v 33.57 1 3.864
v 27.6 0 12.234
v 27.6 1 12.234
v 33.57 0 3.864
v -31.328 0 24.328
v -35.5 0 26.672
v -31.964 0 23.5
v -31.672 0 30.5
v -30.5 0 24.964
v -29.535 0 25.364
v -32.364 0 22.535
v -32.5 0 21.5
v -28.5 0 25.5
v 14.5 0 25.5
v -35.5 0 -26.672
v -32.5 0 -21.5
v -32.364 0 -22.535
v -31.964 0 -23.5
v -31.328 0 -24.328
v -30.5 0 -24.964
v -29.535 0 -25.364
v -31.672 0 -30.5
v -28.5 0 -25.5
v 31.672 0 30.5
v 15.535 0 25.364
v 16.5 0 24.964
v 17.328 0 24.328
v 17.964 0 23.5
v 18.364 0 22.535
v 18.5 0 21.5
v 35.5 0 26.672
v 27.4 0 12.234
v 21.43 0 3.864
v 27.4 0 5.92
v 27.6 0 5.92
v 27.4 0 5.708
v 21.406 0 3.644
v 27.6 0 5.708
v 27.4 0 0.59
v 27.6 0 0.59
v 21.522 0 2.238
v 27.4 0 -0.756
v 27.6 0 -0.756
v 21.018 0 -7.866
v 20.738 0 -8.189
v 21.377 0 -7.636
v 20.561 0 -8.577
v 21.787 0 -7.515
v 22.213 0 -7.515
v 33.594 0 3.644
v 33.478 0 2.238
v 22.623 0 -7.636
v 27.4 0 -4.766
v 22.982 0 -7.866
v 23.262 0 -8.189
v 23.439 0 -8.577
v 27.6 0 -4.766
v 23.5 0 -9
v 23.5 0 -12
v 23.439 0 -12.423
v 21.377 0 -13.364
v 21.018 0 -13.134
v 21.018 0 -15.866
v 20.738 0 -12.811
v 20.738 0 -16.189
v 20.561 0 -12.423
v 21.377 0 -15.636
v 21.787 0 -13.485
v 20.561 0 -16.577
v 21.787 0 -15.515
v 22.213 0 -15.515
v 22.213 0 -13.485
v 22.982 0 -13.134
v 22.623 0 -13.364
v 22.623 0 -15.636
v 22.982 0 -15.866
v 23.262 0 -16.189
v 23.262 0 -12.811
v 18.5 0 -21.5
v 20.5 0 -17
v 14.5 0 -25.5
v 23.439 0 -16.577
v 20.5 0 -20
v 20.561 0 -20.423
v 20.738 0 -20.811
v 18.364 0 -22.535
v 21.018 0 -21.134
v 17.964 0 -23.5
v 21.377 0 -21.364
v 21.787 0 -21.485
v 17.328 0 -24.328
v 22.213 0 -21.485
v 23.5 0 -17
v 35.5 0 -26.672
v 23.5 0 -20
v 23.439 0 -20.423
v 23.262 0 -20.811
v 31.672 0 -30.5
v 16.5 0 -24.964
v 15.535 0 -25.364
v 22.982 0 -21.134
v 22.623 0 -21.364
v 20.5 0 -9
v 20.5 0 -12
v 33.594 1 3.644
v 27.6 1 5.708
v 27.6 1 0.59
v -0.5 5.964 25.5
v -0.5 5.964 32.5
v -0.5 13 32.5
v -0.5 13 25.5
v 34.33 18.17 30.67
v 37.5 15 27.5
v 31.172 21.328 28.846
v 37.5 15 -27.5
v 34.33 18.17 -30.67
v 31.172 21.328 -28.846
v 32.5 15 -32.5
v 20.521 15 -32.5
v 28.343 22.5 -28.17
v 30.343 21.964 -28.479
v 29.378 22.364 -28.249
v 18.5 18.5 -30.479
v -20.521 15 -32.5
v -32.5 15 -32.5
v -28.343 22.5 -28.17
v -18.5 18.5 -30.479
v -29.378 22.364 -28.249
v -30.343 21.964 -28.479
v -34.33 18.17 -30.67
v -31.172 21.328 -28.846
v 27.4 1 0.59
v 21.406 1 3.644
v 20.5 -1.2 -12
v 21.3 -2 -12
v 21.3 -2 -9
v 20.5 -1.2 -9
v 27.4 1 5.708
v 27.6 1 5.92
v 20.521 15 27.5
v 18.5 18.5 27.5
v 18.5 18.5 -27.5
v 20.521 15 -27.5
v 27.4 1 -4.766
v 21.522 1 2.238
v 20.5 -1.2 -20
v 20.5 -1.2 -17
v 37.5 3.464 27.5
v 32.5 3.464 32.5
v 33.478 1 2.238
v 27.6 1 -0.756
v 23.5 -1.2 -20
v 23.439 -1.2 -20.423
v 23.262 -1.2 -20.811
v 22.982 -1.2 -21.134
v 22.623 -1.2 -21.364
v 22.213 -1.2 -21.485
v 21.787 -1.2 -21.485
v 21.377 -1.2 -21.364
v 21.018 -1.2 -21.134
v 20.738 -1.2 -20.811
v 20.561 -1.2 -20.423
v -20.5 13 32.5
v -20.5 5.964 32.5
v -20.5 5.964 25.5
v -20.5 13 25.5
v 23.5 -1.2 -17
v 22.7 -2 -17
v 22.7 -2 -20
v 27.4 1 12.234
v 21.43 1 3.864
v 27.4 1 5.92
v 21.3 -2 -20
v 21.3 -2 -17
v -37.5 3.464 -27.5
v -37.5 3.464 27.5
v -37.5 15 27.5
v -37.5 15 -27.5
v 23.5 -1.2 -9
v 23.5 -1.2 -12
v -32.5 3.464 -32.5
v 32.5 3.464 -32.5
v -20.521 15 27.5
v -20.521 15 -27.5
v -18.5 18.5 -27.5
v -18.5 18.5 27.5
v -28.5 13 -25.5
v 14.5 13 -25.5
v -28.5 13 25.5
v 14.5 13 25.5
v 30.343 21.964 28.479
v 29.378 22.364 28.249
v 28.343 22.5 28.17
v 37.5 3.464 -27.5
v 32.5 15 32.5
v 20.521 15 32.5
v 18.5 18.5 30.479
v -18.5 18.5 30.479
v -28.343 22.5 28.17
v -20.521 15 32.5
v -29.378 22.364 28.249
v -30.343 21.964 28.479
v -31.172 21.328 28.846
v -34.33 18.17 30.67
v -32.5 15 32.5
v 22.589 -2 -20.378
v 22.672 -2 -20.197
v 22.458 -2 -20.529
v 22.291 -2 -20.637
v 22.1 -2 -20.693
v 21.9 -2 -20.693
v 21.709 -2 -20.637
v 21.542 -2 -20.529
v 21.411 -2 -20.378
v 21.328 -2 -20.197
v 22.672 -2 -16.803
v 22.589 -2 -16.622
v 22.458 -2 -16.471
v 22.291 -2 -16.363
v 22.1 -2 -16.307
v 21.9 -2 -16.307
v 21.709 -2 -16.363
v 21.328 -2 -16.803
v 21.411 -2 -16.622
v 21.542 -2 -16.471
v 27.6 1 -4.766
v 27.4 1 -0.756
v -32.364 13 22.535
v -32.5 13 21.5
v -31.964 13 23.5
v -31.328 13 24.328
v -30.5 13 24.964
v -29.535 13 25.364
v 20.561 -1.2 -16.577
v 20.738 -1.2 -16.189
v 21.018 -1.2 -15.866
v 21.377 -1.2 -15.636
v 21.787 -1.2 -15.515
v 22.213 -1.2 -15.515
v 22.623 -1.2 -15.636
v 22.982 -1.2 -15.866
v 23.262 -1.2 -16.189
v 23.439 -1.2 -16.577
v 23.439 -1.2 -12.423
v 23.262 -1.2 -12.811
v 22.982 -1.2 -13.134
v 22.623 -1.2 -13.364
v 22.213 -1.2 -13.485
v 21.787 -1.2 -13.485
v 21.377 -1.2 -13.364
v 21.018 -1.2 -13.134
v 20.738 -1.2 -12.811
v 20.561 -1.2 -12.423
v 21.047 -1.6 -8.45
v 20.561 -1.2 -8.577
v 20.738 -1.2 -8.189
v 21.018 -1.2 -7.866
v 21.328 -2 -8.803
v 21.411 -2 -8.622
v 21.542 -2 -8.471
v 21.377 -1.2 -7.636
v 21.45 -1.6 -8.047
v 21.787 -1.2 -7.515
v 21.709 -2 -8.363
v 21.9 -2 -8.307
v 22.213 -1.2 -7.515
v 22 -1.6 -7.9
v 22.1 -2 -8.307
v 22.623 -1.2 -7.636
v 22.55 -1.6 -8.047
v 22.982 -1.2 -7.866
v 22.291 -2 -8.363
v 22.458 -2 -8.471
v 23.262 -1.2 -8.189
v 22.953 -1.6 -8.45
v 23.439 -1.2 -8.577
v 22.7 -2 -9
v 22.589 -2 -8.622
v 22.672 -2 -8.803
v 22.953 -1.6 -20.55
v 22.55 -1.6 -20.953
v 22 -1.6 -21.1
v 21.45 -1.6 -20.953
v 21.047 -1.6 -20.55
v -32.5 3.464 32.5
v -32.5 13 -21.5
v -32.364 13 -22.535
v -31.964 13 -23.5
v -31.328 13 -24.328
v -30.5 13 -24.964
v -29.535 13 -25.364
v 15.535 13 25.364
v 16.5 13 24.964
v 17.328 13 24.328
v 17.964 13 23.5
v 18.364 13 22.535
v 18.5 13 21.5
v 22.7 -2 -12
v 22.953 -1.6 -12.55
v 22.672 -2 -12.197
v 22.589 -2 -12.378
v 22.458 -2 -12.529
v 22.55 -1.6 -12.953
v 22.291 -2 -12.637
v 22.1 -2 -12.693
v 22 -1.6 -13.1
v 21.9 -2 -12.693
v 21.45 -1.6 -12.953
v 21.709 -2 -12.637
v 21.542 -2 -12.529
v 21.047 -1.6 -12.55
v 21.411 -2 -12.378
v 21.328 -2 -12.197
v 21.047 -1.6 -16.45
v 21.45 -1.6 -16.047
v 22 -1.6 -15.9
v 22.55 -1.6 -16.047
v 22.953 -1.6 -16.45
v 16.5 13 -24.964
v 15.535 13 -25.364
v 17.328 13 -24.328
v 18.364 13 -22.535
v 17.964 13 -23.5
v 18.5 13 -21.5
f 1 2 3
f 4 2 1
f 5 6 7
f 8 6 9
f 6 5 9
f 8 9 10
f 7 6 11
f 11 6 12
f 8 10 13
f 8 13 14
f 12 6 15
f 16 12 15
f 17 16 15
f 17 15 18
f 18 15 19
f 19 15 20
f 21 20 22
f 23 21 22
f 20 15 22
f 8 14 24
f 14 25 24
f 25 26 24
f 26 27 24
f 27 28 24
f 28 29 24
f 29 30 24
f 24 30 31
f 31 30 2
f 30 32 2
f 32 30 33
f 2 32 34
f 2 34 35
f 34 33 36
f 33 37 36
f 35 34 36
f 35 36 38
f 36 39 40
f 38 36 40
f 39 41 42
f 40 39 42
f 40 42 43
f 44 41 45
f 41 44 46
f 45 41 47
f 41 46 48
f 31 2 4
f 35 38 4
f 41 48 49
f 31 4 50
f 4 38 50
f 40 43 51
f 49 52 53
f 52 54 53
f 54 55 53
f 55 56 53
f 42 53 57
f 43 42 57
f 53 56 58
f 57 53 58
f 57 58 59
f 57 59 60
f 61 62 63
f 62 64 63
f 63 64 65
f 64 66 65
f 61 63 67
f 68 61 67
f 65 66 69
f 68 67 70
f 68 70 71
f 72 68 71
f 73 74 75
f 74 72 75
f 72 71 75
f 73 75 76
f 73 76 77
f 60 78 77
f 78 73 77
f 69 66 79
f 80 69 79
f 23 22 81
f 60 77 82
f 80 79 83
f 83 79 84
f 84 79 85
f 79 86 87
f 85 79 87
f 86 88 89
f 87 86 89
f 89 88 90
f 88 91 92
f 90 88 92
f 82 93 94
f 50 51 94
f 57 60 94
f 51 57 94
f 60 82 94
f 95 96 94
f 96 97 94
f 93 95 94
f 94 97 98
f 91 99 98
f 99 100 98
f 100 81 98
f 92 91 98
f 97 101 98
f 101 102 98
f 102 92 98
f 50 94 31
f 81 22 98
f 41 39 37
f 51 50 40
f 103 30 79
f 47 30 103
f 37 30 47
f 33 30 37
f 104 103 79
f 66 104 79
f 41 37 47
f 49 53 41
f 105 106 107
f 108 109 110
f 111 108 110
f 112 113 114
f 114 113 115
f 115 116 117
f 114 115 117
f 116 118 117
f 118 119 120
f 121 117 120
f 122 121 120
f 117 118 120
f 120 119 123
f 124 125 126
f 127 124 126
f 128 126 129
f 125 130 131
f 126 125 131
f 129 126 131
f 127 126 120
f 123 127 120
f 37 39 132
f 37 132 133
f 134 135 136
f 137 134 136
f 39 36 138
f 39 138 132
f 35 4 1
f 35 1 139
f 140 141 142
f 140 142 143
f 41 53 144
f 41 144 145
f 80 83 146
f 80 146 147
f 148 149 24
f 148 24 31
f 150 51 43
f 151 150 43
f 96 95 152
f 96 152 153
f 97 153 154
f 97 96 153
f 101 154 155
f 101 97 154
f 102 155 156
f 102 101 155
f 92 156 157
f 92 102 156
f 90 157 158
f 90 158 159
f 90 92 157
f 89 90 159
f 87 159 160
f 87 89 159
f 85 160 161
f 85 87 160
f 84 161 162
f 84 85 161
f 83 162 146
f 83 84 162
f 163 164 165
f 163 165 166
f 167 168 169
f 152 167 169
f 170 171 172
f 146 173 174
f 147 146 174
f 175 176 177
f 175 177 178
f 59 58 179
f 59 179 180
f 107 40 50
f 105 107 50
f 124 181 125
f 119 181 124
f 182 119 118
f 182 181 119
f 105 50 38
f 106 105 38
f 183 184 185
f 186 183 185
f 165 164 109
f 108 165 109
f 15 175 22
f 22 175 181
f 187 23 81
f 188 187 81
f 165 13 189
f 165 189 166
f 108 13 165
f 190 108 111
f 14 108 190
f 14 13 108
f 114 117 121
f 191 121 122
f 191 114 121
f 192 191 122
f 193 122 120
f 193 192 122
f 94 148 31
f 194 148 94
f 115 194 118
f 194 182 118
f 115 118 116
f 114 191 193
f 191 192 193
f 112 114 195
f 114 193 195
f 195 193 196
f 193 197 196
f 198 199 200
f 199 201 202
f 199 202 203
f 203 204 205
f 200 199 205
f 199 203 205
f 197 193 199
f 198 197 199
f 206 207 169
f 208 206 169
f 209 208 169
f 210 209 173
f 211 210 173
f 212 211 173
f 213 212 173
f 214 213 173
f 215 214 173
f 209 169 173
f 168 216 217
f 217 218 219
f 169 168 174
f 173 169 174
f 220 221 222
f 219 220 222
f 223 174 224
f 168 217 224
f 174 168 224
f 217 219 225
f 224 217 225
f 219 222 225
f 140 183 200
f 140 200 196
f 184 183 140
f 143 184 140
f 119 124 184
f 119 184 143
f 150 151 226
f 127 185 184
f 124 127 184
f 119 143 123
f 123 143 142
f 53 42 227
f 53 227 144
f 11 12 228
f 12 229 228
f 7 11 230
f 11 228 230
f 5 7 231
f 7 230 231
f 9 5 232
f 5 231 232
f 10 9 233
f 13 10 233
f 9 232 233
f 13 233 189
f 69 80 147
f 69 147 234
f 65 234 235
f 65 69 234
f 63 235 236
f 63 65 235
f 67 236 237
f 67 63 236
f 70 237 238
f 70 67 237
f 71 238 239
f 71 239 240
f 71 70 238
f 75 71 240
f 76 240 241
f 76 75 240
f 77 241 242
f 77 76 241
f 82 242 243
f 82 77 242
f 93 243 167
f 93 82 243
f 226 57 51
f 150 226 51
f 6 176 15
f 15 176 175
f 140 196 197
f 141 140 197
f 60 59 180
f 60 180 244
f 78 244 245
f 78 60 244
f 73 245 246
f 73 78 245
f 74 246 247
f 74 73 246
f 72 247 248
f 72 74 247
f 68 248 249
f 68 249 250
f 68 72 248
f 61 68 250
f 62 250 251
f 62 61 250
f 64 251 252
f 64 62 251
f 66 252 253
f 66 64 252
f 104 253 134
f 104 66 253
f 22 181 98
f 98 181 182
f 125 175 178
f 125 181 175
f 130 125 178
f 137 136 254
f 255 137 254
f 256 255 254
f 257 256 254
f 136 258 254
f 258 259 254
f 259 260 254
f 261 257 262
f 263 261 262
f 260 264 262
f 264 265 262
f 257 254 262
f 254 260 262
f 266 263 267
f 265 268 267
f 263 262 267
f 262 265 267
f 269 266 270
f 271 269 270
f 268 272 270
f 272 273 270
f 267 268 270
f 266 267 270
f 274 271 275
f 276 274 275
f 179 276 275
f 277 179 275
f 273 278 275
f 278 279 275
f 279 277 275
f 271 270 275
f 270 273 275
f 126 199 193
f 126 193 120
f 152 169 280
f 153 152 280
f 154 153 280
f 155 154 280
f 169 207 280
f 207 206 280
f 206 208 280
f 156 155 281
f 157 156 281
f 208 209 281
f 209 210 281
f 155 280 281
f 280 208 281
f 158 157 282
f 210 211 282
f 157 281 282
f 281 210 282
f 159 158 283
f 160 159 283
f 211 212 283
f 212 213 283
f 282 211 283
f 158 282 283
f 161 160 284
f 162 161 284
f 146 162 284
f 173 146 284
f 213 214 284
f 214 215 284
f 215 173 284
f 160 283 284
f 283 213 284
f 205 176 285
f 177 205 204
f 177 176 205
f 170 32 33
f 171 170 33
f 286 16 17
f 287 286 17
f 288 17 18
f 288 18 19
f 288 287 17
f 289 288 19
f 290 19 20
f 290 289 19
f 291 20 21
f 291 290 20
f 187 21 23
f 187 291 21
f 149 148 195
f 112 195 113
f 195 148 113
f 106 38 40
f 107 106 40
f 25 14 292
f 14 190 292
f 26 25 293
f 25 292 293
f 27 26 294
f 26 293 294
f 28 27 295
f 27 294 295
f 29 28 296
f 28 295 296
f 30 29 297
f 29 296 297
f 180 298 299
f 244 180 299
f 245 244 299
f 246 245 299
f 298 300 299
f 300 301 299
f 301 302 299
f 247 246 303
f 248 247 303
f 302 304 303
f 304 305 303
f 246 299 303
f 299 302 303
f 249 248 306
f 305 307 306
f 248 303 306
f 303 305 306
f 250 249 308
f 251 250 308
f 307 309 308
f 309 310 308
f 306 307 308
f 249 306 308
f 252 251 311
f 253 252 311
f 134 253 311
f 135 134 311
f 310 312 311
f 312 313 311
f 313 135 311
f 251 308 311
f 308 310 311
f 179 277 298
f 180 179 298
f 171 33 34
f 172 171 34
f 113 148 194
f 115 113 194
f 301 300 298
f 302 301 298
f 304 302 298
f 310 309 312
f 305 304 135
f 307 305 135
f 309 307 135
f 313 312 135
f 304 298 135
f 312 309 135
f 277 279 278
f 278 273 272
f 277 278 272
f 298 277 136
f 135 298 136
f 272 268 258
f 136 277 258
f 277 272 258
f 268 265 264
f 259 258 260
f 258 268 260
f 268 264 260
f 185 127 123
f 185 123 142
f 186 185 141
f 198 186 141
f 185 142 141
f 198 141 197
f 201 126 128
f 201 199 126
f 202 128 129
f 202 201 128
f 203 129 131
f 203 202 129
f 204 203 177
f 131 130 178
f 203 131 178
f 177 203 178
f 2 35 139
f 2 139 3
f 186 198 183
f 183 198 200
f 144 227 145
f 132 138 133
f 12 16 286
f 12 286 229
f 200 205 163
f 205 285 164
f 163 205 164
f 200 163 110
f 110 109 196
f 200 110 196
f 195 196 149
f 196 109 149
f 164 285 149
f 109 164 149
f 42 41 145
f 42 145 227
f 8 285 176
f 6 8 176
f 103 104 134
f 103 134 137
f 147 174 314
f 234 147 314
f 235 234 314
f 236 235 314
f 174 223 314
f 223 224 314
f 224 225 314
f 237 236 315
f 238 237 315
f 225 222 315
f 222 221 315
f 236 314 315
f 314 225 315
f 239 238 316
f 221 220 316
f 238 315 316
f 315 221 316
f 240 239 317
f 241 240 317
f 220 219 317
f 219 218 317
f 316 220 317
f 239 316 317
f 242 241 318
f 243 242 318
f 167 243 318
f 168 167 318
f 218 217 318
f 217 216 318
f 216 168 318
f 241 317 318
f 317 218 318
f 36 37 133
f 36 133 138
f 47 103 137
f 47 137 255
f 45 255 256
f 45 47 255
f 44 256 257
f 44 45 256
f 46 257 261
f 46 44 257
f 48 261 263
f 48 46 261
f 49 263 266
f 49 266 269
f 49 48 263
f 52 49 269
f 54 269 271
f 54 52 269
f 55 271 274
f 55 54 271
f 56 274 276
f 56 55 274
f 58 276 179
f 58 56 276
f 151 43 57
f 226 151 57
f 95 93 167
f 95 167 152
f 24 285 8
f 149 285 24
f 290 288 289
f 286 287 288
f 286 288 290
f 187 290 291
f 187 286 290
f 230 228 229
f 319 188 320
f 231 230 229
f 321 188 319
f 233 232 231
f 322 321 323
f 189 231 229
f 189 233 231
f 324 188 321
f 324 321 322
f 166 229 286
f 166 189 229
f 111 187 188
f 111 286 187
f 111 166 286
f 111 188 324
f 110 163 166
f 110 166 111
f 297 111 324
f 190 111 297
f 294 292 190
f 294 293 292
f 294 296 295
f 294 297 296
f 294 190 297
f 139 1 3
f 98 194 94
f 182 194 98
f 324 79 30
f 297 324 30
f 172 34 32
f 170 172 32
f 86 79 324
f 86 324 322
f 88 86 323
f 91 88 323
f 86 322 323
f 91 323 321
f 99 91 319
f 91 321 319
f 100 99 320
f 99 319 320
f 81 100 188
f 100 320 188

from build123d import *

# Parameters (mm, degrees)
SKETCH2_W           = 75
SKETCH2_H           = 65
BOSS_EXTRUDE1_DEPTH = 15
BOSS_EXTRUDE3_START = -5
BOSS_EXTRUDE3_DEPTH = 55
CHAMFER1_SIZE       = 5
CHAMFER1_SIZE_2     = 8.660254038
CHAMFER2_SIZE       = 8.660254038
CHAMFER2_SIZE_2     = 5
FILLET3_R           = 4
SKETCH5_W           = 51
SKETCH5_H           = 51
CUT_EXTRUDE2_DEPTH  = 13
CHAMFER3_SIZE       = 5
FILLET4_R           = 4
CUT_EXTRUDE3_DEPTH  = 1
BOSS_EXTRUDE4_DEPTH = 2
CHAMFER5_SIZE       = 0.8
CHAMFER6_SIZE       = 2
CHAMFER6_SIZE2      = 3.464101615
CUT_EXTRUDE4_REACH  = 80.342
SKETCH10_W          = 20
SKETCH10_H          = 7.035898385


with BuildPart() as part:
    # Sketch2 → Boss-Extrude1 (new body)
    with BuildSketch(Plane(origin=(0, 0, 0), x_dir=(1, 0, 0), z_dir=(0, 1, 0))):
        Rectangle(SKETCH2_W, SKETCH2_H)
    extrude(amount=BOSS_EXTRUDE1_DEPTH)

    # Sketch4 → Boss-Extrude3 (add)
    with BuildSketch(Plane.XY.offset(32.5).offset(BOSS_EXTRUDE3_START)):
        Polygon((-30, 22.5), (-37.5, 15), (-20.520725942, 15), (-18.5, 18.5), (18.5, 18.5), (20.520725942, 15), (37.5, 15), (30, 22.5), align=None)
    extrude(amount=-BOSS_EXTRUDE3_DEPTH)

    # Chamfer1
    # the kernel refuses this chamfer: 8.660254038, 5 mm, written as the material it adds along each edge
    with BuildSketch(Plane(origin=(-37.5, 15, -27.5), x_dir=(0, -0.05789386240267149, -0.9983227437537926), z_dir=(1, 0, 0))) as chamfer1_piece_1_section:
        Polygon((CHAMFER1_SIZE * 0.998322743754, CHAMFER1_SIZE * 0.0578938624027), (-CHAMFER1_SIZE_2 * 0.0578938624016, CHAMFER1_SIZE_2 * 0.998322743736), (0, 0), align=None)
    chamfer1_piece_1 = extrude(amount=39.384093911, mode=Mode.PRIVATE)
    chamfer1_piece_1 = split(chamfer1_piece_1, bisect_by=Plane(origin=(-27.856272833, 16.457627442, -32.5), z_dir=(0, 0, 1)), keep=Keep.TOP, mode=Mode.PRIVATE)
    chamfer1_piece_1 = split(chamfer1_piece_1, bisect_by=Plane(origin=(-21.723441468, 12.916835603, -29.537993549), z_dir=(-0.8660254037844403, 0.49999999999999734, 0)), keep=Keep.TOP, mode=Mode.PRIVATE)
    chamfer1_piece_1 = split(chamfer1_piece_1, bisect_by=Plane(origin=(-31.949322695, 20.550677305, -29.537993549), z_dir=(0.7071067811865487, -0.7071067811865464, 0)), keep=Keep.TOP, mode=Mode.PRIVATE)
    chamfer1_piece_1 = split(chamfer1_piece_1, bisect_by=Plane(origin=(-27.856272833, 18.5, -29.537993549), z_dir=(0, -1, 0)), keep=Keep.TOP, mode=Mode.PRIVATE)
    add(chamfer1_piece_1)
    with BuildSketch(Plane(origin=(-37.5, 15, -27.5), x_dir=(0, -0.05789386240267149, -0.9983227437537926), z_dir=(1, 0, 0))) as chamfer1_piece_2_section:
        Polygon((CHAMFER1_SIZE * 0.998322743754, CHAMFER1_SIZE * 0.0578938624027), (-CHAMFER1_SIZE_2 * 0.0578938624016, CHAMFER1_SIZE_2 * 0.998322743736), (0, 0), align=None)
    chamfer1_piece_2 = extrude(amount=39.384093911, mode=Mode.PRIVATE)
    chamfer1_piece_2 = split(chamfer1_piece_2, bisect_by=Plane(origin=(-19.426417994, 16.895396965, -28.430435977), z_dir=(-0.8660254037844403, 0.49999999999999734, 0)), keep=Keep.TOP, mode=Mode.PRIVATE)
    chamfer1_piece_2 = split(chamfer1_piece_2, bisect_by=Plane(origin=(-28.690098083, 23.809901917, -28.430435977), z_dir=(0.7071067811865487, -0.7071067811865464, 0)), keep=Keep.TOP, mode=Mode.PRIVATE)
    chamfer1_piece_2 = split(chamfer1_piece_2, bisect_by=Plane(origin=(-24.984626048, 22.5, -28.430435977), z_dir=(0, -1, 0)), keep=Keep.TOP, mode=Mode.PRIVATE)
    chamfer1_piece_2 = split(chamfer1_piece_2, bisect_by=Plane(origin=(-24.984626048, 18.5, -28.430435977), z_dir=(0, 1, 0)), keep=Keep.TOP, mode=Mode.PRIVATE)
    add(chamfer1_piece_2)
    with BuildSketch(Plane(origin=(-37.5, 15, -27.5), x_dir=(0, -0.05789386240267149, -0.9983227437537926), z_dir=(1, 0, 0))) as chamfer1_piece_3_section:
        Polygon((CHAMFER1_SIZE * 0.998322743754, CHAMFER1_SIZE * 0.0578938624027), (-CHAMFER1_SIZE_2 * 0.0578938624016, CHAMFER1_SIZE_2 * 0.998322743736), (0, 0), align=None)
    chamfer1_piece_3 = extrude(amount=39.384093911, mode=Mode.PRIVATE)
    chamfer1_piece_3 = split(chamfer1_piece_3, bisect_by=Plane(origin=(-15.142166091, 24.315938934, -28.430858153), z_dir=(0.8660254037844403, -0.49999999999999734, 0)), keep=Keep.TOP, mode=Mode.PRIVATE)
    chamfer1_piece_3 = split(chamfer1_piece_3, bisect_by=Plane(origin=(-7.845197519, 22.5, -28.430858153), z_dir=(0, -1, 0)), keep=Keep.TOP, mode=Mode.PRIVATE)
    chamfer1_piece_3 = split(chamfer1_piece_3, bisect_by=Plane(origin=(-7.845197519, 18.5, -28.430858153), z_dir=(0, 1, 0)), keep=Keep.TOP, mode=Mode.PRIVATE)
    add(chamfer1_piece_3)
    with BuildSketch(Plane(origin=(-1.884093911, 15, -27.5), x_dir=(0, -0.05789386240267149, -0.9983227437537926), z_dir=(1, 0, 0))) as chamfer1_piece_4_section:
        Polygon((CHAMFER1_SIZE * 0.998322743754, CHAMFER1_SIZE * 0.0578938624027), (-CHAMFER1_SIZE_2 * 0.0578938624016, CHAMFER1_SIZE_2 * 0.998322743736), (0, 0), align=None)
    chamfer1_piece_4 = extrude(amount=39.384093911, mode=Mode.PRIVATE)
    chamfer1_piece_4 = split(chamfer1_piece_4, bisect_by=Plane(origin=(15.142166091, 24.315938934, -28.430858153), z_dir=(-0.8660254037844395, -0.4999999999999986, 0)), keep=Keep.TOP, mode=Mode.PRIVATE)
    chamfer1_piece_4 = split(chamfer1_piece_4, bisect_by=Plane(origin=(7.845197519, 22.5, -28.430858153), z_dir=(0, -1, 0)), keep=Keep.TOP, mode=Mode.PRIVATE)
    chamfer1_piece_4 = split(chamfer1_piece_4, bisect_by=Plane(origin=(7.845197519, 18.5, -28.430858153), z_dir=(0, 1, 0)), keep=Keep.TOP, mode=Mode.PRIVATE)
    add(chamfer1_piece_4)
    with BuildSketch(Plane(origin=(-1.884093911, 15, -27.5), x_dir=(0, -0.05789386240267149, -0.9983227437537926), z_dir=(1, 0, 0))) as chamfer1_piece_5_section:
        Polygon((CHAMFER1_SIZE * 0.998322743754, CHAMFER1_SIZE * 0.0578938624027), (-CHAMFER1_SIZE_2 * 0.0578938624016, CHAMFER1_SIZE_2 * 0.998322743736), (0, 0), align=None)
    chamfer1_piece_5 = extrude(amount=39.384093911, mode=Mode.PRIVATE)
    chamfer1_piece_5 = split(chamfer1_piece_5, bisect_by=Plane(origin=(21.723441468, 12.916835603, -29.537993549), z_dir=(0.8660254037844395, 0.4999999999999986, 0)), keep=Keep.TOP, mode=Mode.PRIVATE)
    chamfer1_piece_5 = split(chamfer1_piece_5, bisect_by=Plane(origin=(27.856272833, 16.457627442, -32.5), z_dir=(0, 0, 1)), keep=Keep.TOP, mode=Mode.PRIVATE)
    chamfer1_piece_5 = split(chamfer1_piece_5, bisect_by=Plane(origin=(31.949322695, 20.550677305, -29.537993549), z_dir=(-0.7071067811865489, -0.7071067811865462, 0)), keep=Keep.TOP, mode=Mode.PRIVATE)
    chamfer1_piece_5 = split(chamfer1_piece_5, bisect_by=Plane(origin=(27.856272833, 18.5, -29.537993549), z_dir=(0, -1, 0)), keep=Keep.TOP, mode=Mode.PRIVATE)
    add(chamfer1_piece_5)
    with BuildSketch(Plane(origin=(-1.884093911, 15, -27.5), x_dir=(0, -0.05789386240267149, -0.9983227437537926), z_dir=(1, 0, 0))) as chamfer1_piece_6_section:
        Polygon((CHAMFER1_SIZE * 0.998322743754, CHAMFER1_SIZE * 0.0578938624027), (-CHAMFER1_SIZE_2 * 0.0578938624016, CHAMFER1_SIZE_2 * 0.998322743736), (0, 0), align=None)
    chamfer1_piece_6 = extrude(amount=39.384093911, mode=Mode.PRIVATE)
    chamfer1_piece_6 = split(chamfer1_piece_6, bisect_by=Plane(origin=(19.426417994, 16.895396965, -28.430435977), z_dir=(0.8660254037844395, 0.4999999999999986, 0)), keep=Keep.TOP, mode=Mode.PRIVATE)
    chamfer1_piece_6 = split(chamfer1_piece_6, bisect_by=Plane(origin=(28.690098083, 23.809901917, -28.430435977), z_dir=(-0.7071067811865489, -0.7071067811865462, 0)), keep=Keep.TOP, mode=Mode.PRIVATE)
    chamfer1_piece_6 = split(chamfer1_piece_6, bisect_by=Plane(origin=(24.984626048, 22.5, -28.430435977), z_dir=(0, -1, 0)), keep=Keep.TOP, mode=Mode.PRIVATE)
    chamfer1_piece_6 = split(chamfer1_piece_6, bisect_by=Plane(origin=(24.984626048, 18.5, -28.430435977), z_dir=(0, 1, 0)), keep=Keep.TOP, mode=Mode.PRIVATE)
    add(chamfer1_piece_6)

    # Chamfer2
    # the kernel refuses this chamfer: 8.660254038, 5 mm, written as the material it adds along each edge
    with BuildSketch(Plane(origin=(-37.5, 15, 27.5), x_dir=(0, 0.9998132206222078, -0.019326765612700497), z_dir=(1, 0, 0))) as chamfer2_piece_1_section:
        Polygon((CHAMFER2_SIZE * 0.999813220604, CHAMFER2_SIZE * 0.0193267656124), (-CHAMFER2_SIZE_2 * 0.0193267656127, CHAMFER2_SIZE_2 * 0.999813220622), (0, 0), align=None)
    chamfer2_piece_1 = extrude(amount=39.384093911, mode=Mode.PRIVATE)
    chamfer2_piece_1 = split(chamfer2_piece_1, bisect_by=Plane(origin=(-24.984626048, 22.5, 28.430435977), z_dir=(0, -1, 0)), keep=Keep.TOP, mode=Mode.PRIVATE)
    chamfer2_piece_1 = split(chamfer2_piece_1, bisect_by=Plane(origin=(-28.690098083, 23.809901917, 28.430435977), z_dir=(0.7071067811865476, -0.7071067811865476, 0)), keep=Keep.TOP, mode=Mode.PRIVATE)
    chamfer2_piece_1 = split(chamfer2_piece_1, bisect_by=Plane(origin=(-19.426417994, 16.895396965, 28.430435977), z_dir=(-0.866025403784329, 0.50000000000019, 0)), keep=Keep.TOP, mode=Mode.PRIVATE)
    chamfer2_piece_1 = split(chamfer2_piece_1, bisect_by=Plane(origin=(-24.984626048, 18.5, 28.430435977), z_dir=(0, 1, 0)), keep=Keep.TOP, mode=Mode.PRIVATE)
    add(chamfer2_piece_1)
    with BuildSketch(Plane(origin=(-37.5, 15, 27.5), x_dir=(0, 0.9998132206222078, -0.019326765612700497), z_dir=(1, 0, 0))) as chamfer2_piece_2_section:
        Polygon((CHAMFER2_SIZE * 0.999813220604, CHAMFER2_SIZE * 0.0193267656124), (-CHAMFER2_SIZE_2 * 0.0193267656127, CHAMFER2_SIZE_2 * 0.999813220622), (0, 0), align=None)
    chamfer2_piece_2 = extrude(amount=39.384093911, mode=Mode.PRIVATE)
    chamfer2_piece_2 = split(chamfer2_piece_2, bisect_by=Plane(origin=(-31.949322695, 20.550677305, 29.537993549), z_dir=(0.7071067811865476, -0.7071067811865476, 0)), keep=Keep.TOP, mode=Mode.PRIVATE)
    chamfer2_piece_2 = split(chamfer2_piece_2, bisect_by=Plane(origin=(-21.723441468, 12.916835603, 29.537993549), z_dir=(-0.866025403784329, 0.50000000000019, 0)), keep=Keep.TOP, mode=Mode.PRIVATE)
    chamfer2_piece_2 = split(chamfer2_piece_2, bisect_by=Plane(origin=(-27.856272833, 18.5, 29.537993549), z_dir=(0, -1, 0)), keep=Keep.TOP, mode=Mode.PRIVATE)
    chamfer2_piece_2 = split(chamfer2_piece_2, bisect_by=Plane(origin=(-27.856272833, 16.457627442, 32.5), z_dir=(0, 0, -1)), keep=Keep.TOP, mode=Mode.PRIVATE)
    add(chamfer2_piece_2)
    with BuildSketch(Plane(origin=(-37.5, 15, 27.5), x_dir=(0, 0.9998132206222078, -0.019326765612700497), z_dir=(1, 0, 0))) as chamfer2_piece_3_section:
        Polygon((CHAMFER2_SIZE * 0.999813220604, CHAMFER2_SIZE * 0.0193267656124), (-CHAMFER2_SIZE_2 * 0.0193267656127, CHAMFER2_SIZE_2 * 0.999813220622), (0, 0), align=None)
    chamfer2_piece_3 = extrude(amount=39.384093911, mode=Mode.PRIVATE)
    chamfer2_piece_3 = split(chamfer2_piece_3, bisect_by=Plane(origin=(-7.845197519, 22.5, 28.430858153), z_dir=(0, -1, 0)), keep=Keep.TOP, mode=Mode.PRIVATE)
    chamfer2_piece_3 = split(chamfer2_piece_3, bisect_by=Plane(origin=(-15.142166091, 24.315938934, 28.430858153), z_dir=(0.866025403784329, -0.50000000000019, 0)), keep=Keep.TOP, mode=Mode.PRIVATE)
    chamfer2_piece_3 = split(chamfer2_piece_3, bisect_by=Plane(origin=(-7.845197519, 18.5, 28.430858153), z_dir=(0, 1, 0)), keep=Keep.TOP, mode=Mode.PRIVATE)
    add(chamfer2_piece_3)
    with BuildSketch(Plane(origin=(-1.884093911, 15, 27.5), x_dir=(0, 0.9998132206222078, -0.019326765612700497), z_dir=(1, 0, 0))) as chamfer2_piece_4_section:
        Polygon((CHAMFER2_SIZE * 0.999813220604, CHAMFER2_SIZE * 0.0193267656124), (-CHAMFER2_SIZE_2 * 0.0193267656127, CHAMFER2_SIZE_2 * 0.999813220622), (0, 0), align=None)
    chamfer2_piece_4 = extrude(amount=39.384093911, mode=Mode.PRIVATE)
    chamfer2_piece_4 = split(chamfer2_piece_4, bisect_by=Plane(origin=(7.845197519, 22.5, 28.430858153), z_dir=(0, -1, 0)), keep=Keep.TOP, mode=Mode.PRIVATE)
    chamfer2_piece_4 = split(chamfer2_piece_4, bisect_by=Plane(origin=(7.845197519, 18.5, 28.430858153), z_dir=(0, 1, 0)), keep=Keep.TOP, mode=Mode.PRIVATE)
    chamfer2_piece_4 = split(chamfer2_piece_4, bisect_by=Plane(origin=(15.142166091, 24.315938934, 28.430858153), z_dir=(-0.866025403784329, -0.50000000000019, 0)), keep=Keep.TOP, mode=Mode.PRIVATE)
    add(chamfer2_piece_4)
    with BuildSketch(Plane(origin=(-1.884093911, 15, 27.5), x_dir=(0, 0.9998132206222078, -0.019326765612700497), z_dir=(1, 0, 0))) as chamfer2_piece_5_section:
        Polygon((CHAMFER2_SIZE * 0.999813220604, CHAMFER2_SIZE * 0.0193267656124), (-CHAMFER2_SIZE_2 * 0.0193267656127, CHAMFER2_SIZE_2 * 0.999813220622), (0, 0), align=None)
    chamfer2_piece_5 = extrude(amount=39.384093911, mode=Mode.PRIVATE)
    chamfer2_piece_5 = split(chamfer2_piece_5, bisect_by=Plane(origin=(28.690098083, 23.809901917, 28.430435977), z_dir=(-0.7071067811865476, -0.7071067811865476, 0)), keep=Keep.TOP, mode=Mode.PRIVATE)
    chamfer2_piece_5 = split(chamfer2_piece_5, bisect_by=Plane(origin=(24.984626048, 22.5, 28.430435977), z_dir=(0, -1, 0)), keep=Keep.TOP, mode=Mode.PRIVATE)
    chamfer2_piece_5 = split(chamfer2_piece_5, bisect_by=Plane(origin=(24.984626048, 18.5, 28.430435977), z_dir=(0, 1, 0)), keep=Keep.TOP, mode=Mode.PRIVATE)
    chamfer2_piece_5 = split(chamfer2_piece_5, bisect_by=Plane(origin=(19.426417994, 16.895396965, 28.430435977), z_dir=(0.866025403784329, 0.50000000000019, 0)), keep=Keep.TOP, mode=Mode.PRIVATE)
    add(chamfer2_piece_5)
    with BuildSketch(Plane(origin=(-1.884093911, 15, 27.5), x_dir=(0, 0.9998132206222078, -0.019326765612700497), z_dir=(1, 0, 0))) as chamfer2_piece_6_section:
        Polygon((CHAMFER2_SIZE * 0.999813220604, CHAMFER2_SIZE * 0.0193267656124), (-CHAMFER2_SIZE_2 * 0.0193267656127, CHAMFER2_SIZE_2 * 0.999813220622), (0, 0), align=None)
    chamfer2_piece_6 = extrude(amount=39.384093911, mode=Mode.PRIVATE)
    chamfer2_piece_6 = split(chamfer2_piece_6, bisect_by=Plane(origin=(31.949322695, 20.550677305, 29.537993549), z_dir=(-0.7071067811865476, -0.7071067811865476, 0)), keep=Keep.TOP, mode=Mode.PRIVATE)
    chamfer2_piece_6 = split(chamfer2_piece_6, bisect_by=Plane(origin=(27.856272833, 18.5, 29.537993549), z_dir=(0, -1, 0)), keep=Keep.TOP, mode=Mode.PRIVATE)
    chamfer2_piece_6 = split(chamfer2_piece_6, bisect_by=Plane(origin=(21.723441468, 12.916835603, 29.537993549), z_dir=(0.866025403784329, 0.50000000000019, 0)), keep=Keep.TOP, mode=Mode.PRIVATE)
    chamfer2_piece_6 = split(chamfer2_piece_6, bisect_by=Plane(origin=(27.856272833, 16.457627442, 32.5), z_dir=(0, 0, -1)), keep=Keep.TOP, mode=Mode.PRIVATE)
    add(chamfer2_piece_6)

    # Fillet3
    fillet3_edges = [part.edges().sort_by_distance(p)[0] for p in [
        (-30, 22.5, 0),
        (30, 22.5, 0),
    ]]
    fillet(fillet3_edges, radius=FILLET3_R)

    # Sketch5 → Cut-Extrude2 (cut)
    with BuildSketch(Plane.XZ):
        with Locations((-7, 0)):
            Rectangle(SKETCH5_W, SKETCH5_H)
    extrude(amount=-CUT_EXTRUDE2_DEPTH, mode=Mode.SUBTRACT)

    # Chamfer3
    chamfer3_edges = [part.edges().sort_by_distance(p)[0] for p in [
        (-37.5, 7.5, -32.5),
        (37.5, 7.5, -32.5),
        (37.5, 7.5, 32.5),
        (-37.5, 7.5, 32.5),
    ]]
    chamfer(chamfer3_edges, length=CHAMFER3_SIZE)

    # Fillet4
    fillet4_edges = [part.edges().sort_by_distance(p)[0] for p in [
        (18.5, 6.5, -25.5),
        (18.5, 6.5, 25.5),
        (-32.5, 6.5, 25.5),
        (-32.5, 6.5, -25.5),
    ]]
    fillet(fillet4_edges, radius=FILLET4_R)

    # Sketch7 → Cut-Extrude3 (cut)
    with BuildSketch(Plane.XZ):
        Polygon((27.4, 12.233709128), (21.42984865, 3.863865625), (27.4, 5.91955359), align=None)
        Polygon((21.406466325, 3.644290309), (27.4, 5.708029454), (27.4, 0.590432369), align=None)
        Polygon((21.52230088, 2.23847817), (27.4, -0.756359116), (27.4, -4.766290872), align=None)
        Polygon((27.6, 5.708029454), (27.6, 0.590432369), (33.593533675, 3.644290309), align=None)
        Polygon((27.6, -0.756359116), (27.6, -4.766290872), (33.47769912, 2.23847817), align=None)
        Polygon((33.57015135, 3.863865625), (27.6, 5.91955359), (27.6, 12.233709128), align=None)
    extrude(amount=-CUT_EXTRUDE3_DEPTH, mode=Mode.SUBTRACT)

    # Sketch9 → Boss-Extrude4 (add)
    with BuildSketch(Plane.XZ):
        with BuildLine():
            Line((20.5, -12), (20.5, -9))
            ThreePointArc((20.5, -9), (22, -7.5), (23.5, -9))
            Line((23.5, -9), (23.5, -12))
            ThreePointArc((23.5, -12), (22, -13.5), (20.5, -12))
        make_face()
        with BuildLine():
            Line((20.5, -20), (20.5, -17))
            ThreePointArc((20.5, -17), (22, -15.5), (23.5, -17))
            Line((23.5, -17), (23.5, -20))
            ThreePointArc((23.5, -20), (22, -21.5), (20.5, -20))
        make_face()
    extrude(amount=BOSS_EXTRUDE4_DEPTH)

    # Chamfer5
    chamfer5_edges = [part.edges().sort_by_distance(p)[0] for p in [
        (22, -2, -13.5),
        (23.5, -2, -10.5),
        (22, -2, -7.5),
        (20.5, -2, -10.5),
        (22, -2, -21.5),
        (23.5, -2, -18.5),
        (22, -2, -15.5),
        (20.5, -2, -18.5),
    ]]
    chamfer(chamfer5_edges, length=CHAMFER5_SIZE)

    # Chamfer6
    chamfer6_edges = [part.edges().sort_by_distance(p)[0] for p in [
        (37.5, 0, 0),
        (-37.5, 0, 0),
        (0, 0, -32.5),
        (0, 0, 32.5),
        (35, 0, -30),
        (-35, 0, -30),
        (-35, 0, 30),
        (35, 0, 30),
    ]]
    chamfer6_side = [part.faces().sort_by_distance(p)[0] for p in [
        (0, 0, 31.507528338),
    ]]
    chamfer(chamfer6_edges, length=CHAMFER6_SIZE, length2=CHAMFER6_SIZE2, reference=chamfer6_side[0])

    # Sketch10 → Cut-Extrude4 (cut, up to next)
    with BuildSketch(Plane.XY.offset(32.5), mode=Mode.PRIVATE) as cut_extrude4_sk1:
        with Locations((-10.5, 9.482050808)):
            Rectangle(SKETCH10_W, SKETCH10_H)
    cut_extrude4_tool1 = extrude(cut_extrude4_sk1.sketch, amount=-CUT_EXTRUDE4_REACH, mode=Mode.PRIVATE) & part.part
    add(cut_extrude4_tool1.solids().sort_by_distance((-10.5, 9.482051, 32.5))[0], mode=Mode.SUBTRACT)


solid = part.part
